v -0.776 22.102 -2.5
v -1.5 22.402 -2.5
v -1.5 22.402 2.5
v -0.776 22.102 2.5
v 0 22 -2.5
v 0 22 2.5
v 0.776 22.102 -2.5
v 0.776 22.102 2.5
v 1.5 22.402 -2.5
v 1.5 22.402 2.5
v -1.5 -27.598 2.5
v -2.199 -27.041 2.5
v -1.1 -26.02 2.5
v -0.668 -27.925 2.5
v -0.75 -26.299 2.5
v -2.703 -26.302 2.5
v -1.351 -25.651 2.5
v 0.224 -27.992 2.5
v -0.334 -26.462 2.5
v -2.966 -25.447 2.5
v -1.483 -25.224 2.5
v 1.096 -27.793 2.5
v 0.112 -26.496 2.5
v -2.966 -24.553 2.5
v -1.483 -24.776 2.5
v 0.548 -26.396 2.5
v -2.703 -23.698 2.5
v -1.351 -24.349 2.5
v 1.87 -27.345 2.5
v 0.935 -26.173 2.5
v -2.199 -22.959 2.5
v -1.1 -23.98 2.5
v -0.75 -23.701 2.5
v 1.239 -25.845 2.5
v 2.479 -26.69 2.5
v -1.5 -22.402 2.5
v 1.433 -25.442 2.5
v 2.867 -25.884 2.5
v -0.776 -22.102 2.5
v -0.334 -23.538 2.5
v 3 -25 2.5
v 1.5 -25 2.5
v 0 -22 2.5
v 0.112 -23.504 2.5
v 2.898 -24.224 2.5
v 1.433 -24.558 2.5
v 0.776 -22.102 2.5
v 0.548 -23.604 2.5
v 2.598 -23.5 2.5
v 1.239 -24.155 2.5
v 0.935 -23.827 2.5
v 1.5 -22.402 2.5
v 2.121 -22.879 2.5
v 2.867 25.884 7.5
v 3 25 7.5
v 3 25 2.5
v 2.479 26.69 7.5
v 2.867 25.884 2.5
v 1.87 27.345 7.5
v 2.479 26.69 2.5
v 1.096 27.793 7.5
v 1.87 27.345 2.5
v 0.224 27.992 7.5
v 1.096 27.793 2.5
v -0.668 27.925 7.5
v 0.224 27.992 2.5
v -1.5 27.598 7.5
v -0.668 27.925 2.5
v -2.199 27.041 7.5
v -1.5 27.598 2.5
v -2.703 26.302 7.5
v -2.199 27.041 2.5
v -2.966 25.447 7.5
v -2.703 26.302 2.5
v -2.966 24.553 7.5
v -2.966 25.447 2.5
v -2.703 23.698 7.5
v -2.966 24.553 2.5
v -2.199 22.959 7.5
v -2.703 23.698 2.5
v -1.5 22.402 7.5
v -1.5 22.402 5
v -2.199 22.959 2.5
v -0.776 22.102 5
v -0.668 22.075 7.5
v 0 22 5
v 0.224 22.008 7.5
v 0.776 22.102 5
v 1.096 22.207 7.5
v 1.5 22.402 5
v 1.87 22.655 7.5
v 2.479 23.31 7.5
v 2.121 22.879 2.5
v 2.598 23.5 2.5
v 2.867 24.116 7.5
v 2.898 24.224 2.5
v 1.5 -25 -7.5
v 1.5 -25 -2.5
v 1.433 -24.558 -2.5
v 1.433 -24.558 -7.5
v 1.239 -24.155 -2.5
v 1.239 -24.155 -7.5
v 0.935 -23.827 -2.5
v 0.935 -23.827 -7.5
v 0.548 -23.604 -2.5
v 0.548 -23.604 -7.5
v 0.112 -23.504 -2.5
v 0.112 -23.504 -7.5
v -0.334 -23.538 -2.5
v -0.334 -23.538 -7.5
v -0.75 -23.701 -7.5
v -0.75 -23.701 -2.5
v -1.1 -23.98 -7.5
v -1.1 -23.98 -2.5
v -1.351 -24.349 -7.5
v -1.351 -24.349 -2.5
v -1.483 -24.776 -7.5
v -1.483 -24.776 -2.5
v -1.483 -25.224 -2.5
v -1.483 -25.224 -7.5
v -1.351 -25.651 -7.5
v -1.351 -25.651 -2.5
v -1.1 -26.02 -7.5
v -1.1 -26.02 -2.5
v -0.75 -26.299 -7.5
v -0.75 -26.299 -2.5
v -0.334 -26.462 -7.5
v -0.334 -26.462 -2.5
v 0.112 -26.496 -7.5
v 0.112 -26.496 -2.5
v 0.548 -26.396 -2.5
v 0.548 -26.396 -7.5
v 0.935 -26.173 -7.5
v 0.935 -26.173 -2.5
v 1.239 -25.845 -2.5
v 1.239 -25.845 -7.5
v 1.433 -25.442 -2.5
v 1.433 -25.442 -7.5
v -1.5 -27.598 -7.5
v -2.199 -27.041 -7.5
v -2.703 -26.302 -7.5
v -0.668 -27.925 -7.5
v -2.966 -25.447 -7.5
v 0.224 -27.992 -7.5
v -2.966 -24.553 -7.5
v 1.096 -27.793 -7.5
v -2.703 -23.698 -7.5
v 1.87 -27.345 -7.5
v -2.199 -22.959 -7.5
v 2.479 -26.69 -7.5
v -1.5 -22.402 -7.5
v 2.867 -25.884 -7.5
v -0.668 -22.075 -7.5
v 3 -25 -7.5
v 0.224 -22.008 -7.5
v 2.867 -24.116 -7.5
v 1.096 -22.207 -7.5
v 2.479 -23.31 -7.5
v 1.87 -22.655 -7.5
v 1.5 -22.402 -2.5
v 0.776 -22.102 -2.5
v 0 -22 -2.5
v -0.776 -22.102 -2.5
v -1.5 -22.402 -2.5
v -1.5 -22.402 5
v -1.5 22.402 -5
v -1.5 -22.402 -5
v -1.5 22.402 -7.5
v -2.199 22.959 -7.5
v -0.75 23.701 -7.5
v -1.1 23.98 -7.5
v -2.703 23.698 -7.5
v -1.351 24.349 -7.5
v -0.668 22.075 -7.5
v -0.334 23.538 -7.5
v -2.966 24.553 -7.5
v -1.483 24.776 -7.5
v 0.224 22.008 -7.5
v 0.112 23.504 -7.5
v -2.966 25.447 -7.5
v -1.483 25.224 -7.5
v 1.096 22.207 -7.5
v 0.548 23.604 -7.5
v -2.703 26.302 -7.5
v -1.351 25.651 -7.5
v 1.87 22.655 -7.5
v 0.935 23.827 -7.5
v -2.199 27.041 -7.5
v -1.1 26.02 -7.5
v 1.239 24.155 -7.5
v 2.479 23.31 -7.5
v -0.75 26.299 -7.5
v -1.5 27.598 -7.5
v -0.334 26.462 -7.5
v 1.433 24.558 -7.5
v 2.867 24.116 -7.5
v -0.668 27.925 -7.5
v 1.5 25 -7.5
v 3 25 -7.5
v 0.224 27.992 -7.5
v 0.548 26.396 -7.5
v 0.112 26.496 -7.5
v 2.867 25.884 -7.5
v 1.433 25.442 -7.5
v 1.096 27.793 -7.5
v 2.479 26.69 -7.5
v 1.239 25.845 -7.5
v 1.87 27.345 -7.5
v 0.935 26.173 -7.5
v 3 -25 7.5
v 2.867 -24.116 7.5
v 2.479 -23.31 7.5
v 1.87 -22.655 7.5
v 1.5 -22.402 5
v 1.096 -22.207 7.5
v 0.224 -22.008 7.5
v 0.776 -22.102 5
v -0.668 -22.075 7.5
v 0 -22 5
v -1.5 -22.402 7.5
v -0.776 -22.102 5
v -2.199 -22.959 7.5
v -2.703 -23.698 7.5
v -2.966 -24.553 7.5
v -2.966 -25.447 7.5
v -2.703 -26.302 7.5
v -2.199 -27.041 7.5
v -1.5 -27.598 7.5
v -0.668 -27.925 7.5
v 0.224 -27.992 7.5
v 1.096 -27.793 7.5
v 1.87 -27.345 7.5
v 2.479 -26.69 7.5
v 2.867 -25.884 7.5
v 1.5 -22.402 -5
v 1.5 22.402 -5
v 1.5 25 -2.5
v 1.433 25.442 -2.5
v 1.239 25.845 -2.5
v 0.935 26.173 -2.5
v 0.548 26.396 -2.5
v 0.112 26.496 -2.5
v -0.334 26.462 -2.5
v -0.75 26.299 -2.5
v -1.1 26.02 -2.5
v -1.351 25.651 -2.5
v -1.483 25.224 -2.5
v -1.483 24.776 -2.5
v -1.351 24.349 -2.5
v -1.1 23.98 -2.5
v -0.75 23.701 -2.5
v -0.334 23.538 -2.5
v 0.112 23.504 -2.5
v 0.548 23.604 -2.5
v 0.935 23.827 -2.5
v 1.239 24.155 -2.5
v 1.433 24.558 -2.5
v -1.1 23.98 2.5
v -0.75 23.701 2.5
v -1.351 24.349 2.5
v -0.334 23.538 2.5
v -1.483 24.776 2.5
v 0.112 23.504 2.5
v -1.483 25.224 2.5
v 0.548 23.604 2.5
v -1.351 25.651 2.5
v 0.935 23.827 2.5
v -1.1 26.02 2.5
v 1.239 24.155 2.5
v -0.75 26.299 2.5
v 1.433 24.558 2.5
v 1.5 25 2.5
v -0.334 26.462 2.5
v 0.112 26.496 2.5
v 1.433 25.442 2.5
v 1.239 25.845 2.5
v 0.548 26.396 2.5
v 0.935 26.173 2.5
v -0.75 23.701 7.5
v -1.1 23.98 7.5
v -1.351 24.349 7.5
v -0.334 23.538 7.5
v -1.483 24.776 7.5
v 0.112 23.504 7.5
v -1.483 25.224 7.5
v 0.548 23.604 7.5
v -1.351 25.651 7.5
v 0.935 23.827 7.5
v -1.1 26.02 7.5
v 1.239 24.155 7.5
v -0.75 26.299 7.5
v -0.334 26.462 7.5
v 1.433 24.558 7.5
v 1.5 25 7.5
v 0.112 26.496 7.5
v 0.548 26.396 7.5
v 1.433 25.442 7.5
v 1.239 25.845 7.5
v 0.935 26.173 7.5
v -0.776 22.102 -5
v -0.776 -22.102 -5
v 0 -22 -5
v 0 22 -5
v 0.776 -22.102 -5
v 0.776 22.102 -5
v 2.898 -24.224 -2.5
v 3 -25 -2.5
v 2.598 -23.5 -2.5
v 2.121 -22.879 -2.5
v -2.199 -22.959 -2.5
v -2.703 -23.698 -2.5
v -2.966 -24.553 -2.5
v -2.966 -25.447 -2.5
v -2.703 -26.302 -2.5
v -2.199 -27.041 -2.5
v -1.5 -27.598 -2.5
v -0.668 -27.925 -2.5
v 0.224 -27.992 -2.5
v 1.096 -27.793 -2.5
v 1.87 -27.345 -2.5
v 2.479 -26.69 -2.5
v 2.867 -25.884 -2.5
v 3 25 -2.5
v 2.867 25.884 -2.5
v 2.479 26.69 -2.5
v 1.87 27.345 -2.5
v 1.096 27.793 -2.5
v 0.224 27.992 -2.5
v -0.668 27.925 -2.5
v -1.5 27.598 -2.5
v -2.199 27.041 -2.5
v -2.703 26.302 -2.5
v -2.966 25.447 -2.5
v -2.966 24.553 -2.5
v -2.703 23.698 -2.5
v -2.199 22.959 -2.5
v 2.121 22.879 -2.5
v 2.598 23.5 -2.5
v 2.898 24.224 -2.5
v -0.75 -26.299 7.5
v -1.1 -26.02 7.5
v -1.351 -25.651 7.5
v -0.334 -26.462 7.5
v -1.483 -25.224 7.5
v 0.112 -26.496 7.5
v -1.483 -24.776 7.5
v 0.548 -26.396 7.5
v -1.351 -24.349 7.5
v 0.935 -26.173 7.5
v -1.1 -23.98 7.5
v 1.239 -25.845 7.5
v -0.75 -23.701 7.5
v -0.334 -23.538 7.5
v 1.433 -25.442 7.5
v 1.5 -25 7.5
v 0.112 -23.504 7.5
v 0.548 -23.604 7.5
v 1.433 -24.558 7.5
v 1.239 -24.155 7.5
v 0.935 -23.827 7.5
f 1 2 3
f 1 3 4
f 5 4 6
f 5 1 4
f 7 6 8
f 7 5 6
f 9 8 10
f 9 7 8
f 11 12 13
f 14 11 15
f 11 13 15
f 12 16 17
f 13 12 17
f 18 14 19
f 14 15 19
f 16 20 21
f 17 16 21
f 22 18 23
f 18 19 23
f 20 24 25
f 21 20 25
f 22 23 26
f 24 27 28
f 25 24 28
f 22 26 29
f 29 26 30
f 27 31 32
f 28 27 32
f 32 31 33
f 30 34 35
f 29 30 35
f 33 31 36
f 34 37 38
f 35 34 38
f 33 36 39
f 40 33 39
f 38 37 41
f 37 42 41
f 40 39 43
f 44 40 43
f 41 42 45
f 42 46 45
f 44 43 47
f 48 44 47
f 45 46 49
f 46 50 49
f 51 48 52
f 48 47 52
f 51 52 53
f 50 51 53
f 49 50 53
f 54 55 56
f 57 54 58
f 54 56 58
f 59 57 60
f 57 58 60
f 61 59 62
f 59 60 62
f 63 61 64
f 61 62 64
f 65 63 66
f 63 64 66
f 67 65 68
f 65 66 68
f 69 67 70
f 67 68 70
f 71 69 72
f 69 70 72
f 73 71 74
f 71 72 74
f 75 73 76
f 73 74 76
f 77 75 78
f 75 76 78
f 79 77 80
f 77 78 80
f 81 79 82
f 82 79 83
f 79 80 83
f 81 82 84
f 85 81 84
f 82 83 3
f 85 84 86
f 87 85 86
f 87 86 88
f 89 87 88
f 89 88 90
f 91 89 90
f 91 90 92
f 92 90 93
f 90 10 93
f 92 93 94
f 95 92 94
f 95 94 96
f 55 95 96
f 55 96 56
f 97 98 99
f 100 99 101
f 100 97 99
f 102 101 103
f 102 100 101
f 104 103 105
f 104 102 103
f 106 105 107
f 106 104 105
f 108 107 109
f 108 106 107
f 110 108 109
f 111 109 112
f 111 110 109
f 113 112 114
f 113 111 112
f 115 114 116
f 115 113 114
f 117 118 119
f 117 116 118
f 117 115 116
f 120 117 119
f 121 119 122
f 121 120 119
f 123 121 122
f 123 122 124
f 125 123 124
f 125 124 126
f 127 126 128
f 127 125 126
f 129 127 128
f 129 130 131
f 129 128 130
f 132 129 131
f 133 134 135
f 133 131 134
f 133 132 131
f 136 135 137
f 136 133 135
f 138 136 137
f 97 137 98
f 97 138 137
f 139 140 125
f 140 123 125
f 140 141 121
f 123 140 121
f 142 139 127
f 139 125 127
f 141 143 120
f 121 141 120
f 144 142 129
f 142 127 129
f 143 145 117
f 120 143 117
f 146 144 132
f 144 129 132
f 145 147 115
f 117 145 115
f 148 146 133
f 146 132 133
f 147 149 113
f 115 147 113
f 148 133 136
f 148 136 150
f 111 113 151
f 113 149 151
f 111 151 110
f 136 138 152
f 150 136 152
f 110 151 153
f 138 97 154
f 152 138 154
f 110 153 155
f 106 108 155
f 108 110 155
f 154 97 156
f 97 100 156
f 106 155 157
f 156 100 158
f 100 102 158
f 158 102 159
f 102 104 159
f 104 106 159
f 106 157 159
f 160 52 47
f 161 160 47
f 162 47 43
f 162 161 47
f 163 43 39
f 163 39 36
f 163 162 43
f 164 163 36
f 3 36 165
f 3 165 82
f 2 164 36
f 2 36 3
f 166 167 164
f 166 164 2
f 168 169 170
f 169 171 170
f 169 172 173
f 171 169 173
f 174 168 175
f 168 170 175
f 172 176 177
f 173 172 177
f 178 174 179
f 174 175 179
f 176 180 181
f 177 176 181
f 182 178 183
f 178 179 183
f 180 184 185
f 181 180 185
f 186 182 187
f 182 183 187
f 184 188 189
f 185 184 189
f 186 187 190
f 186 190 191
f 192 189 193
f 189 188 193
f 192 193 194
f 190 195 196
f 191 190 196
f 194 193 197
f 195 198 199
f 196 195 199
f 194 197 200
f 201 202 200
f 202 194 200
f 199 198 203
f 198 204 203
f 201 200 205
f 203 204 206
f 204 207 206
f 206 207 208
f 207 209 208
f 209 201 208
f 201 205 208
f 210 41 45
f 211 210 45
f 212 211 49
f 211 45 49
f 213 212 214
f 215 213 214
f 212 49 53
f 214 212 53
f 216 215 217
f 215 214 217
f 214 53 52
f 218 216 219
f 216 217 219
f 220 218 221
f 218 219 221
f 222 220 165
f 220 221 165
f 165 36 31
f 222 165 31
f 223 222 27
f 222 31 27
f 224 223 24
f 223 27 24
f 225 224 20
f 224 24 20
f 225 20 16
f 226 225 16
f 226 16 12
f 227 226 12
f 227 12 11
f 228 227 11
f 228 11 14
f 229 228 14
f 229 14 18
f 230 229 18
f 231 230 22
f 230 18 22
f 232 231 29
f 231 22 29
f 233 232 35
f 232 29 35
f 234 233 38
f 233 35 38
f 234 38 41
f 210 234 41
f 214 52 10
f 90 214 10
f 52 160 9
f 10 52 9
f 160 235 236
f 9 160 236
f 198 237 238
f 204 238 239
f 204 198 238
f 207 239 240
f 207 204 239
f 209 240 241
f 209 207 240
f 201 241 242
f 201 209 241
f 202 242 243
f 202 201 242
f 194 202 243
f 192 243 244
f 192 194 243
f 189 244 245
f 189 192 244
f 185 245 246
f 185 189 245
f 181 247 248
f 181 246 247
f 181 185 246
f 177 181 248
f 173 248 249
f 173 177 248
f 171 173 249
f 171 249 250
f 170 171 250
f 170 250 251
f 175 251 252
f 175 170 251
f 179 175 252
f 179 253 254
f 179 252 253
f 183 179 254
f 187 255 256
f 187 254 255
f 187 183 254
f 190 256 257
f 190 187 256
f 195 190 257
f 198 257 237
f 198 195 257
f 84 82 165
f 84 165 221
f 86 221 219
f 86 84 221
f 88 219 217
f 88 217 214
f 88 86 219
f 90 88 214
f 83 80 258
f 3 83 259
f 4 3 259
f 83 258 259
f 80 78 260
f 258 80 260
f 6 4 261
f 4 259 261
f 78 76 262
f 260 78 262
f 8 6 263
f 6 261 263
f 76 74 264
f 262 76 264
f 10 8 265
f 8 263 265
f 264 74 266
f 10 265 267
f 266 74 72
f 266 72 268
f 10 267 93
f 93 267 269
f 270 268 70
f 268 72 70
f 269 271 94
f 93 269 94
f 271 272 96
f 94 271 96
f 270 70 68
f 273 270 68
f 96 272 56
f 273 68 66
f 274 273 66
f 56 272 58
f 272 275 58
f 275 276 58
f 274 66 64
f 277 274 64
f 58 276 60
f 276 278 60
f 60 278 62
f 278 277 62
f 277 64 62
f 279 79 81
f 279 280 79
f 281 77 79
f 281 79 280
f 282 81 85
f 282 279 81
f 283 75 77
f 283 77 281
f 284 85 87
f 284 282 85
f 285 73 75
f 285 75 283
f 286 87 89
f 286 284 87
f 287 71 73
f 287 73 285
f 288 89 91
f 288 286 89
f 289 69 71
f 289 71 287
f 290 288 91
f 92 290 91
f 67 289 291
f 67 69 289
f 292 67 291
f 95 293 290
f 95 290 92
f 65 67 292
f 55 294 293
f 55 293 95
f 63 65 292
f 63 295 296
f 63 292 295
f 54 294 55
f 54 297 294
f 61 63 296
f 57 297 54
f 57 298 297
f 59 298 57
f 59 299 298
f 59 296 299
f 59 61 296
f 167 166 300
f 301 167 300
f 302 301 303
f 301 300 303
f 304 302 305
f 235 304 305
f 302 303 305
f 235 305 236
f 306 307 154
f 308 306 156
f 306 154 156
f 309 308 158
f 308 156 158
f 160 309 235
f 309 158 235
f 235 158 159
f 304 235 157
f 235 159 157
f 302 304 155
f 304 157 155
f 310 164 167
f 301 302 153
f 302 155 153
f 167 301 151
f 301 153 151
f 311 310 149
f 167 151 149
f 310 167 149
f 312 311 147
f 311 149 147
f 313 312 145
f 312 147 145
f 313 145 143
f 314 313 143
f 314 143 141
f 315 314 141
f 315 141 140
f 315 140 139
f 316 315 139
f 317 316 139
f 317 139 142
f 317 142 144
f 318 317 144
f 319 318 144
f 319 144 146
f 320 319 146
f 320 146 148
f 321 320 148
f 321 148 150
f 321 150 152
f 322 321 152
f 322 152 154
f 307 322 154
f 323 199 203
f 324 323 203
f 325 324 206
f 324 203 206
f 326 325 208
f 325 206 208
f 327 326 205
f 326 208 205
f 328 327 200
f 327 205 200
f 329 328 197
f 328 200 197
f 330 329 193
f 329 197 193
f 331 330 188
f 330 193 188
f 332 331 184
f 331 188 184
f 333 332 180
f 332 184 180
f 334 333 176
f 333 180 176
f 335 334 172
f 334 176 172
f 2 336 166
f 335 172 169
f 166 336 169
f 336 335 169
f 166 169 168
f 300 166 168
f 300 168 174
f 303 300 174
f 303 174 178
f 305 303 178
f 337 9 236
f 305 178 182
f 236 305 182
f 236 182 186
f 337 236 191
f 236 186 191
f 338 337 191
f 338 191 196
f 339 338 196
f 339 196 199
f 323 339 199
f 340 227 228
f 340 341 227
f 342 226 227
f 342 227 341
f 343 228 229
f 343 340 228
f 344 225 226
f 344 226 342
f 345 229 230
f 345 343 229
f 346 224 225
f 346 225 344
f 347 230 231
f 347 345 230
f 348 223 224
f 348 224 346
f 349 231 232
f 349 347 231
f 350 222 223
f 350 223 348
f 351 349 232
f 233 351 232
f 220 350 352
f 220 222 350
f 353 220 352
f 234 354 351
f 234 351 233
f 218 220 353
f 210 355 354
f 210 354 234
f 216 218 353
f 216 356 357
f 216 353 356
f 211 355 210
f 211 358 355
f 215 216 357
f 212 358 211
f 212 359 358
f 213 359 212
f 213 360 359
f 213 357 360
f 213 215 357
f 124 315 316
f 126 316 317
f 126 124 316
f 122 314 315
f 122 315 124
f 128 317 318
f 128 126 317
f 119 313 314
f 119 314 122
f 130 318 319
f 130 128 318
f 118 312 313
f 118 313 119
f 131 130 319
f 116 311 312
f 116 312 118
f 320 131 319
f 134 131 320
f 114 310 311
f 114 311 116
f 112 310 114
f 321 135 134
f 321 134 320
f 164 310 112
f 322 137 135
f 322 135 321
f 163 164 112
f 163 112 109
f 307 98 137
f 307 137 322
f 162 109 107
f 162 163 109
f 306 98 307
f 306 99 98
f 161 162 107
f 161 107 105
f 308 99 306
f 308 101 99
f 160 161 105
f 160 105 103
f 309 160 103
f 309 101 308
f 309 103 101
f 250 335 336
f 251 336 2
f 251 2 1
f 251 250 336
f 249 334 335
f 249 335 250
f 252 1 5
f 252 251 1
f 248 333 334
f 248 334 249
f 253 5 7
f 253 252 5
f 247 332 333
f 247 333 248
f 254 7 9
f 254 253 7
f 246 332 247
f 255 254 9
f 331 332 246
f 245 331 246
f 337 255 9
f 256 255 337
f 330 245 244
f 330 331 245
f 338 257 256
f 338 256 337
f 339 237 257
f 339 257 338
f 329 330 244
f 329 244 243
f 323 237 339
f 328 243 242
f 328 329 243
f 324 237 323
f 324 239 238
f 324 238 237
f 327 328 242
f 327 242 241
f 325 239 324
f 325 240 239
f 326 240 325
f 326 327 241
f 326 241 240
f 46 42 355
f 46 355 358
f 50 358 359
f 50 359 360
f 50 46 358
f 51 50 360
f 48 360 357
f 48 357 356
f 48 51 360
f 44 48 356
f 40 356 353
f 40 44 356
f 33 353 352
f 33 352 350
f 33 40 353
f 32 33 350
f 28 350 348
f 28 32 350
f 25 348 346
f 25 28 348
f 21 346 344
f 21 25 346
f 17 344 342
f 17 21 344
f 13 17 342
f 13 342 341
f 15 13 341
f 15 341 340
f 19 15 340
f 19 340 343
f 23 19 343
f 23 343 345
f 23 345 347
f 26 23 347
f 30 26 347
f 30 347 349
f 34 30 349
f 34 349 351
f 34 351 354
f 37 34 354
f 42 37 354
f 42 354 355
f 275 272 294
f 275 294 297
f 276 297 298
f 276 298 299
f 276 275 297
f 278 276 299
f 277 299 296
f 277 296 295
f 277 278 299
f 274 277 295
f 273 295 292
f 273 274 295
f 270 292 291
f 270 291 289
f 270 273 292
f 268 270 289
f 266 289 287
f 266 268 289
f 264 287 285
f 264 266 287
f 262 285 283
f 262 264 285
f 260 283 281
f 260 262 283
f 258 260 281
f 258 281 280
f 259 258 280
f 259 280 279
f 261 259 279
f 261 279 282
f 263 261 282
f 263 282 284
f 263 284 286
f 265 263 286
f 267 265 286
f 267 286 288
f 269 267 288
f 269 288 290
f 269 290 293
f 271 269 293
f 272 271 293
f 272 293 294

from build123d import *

# Parameters (mm, degrees)
SALIENTE_EXTRUIR1_DEPTH      = 5
SALIENTE_EXTRUIR1_DEPTH_BACK = 5
CROQUIS1_W                   = 3
CROQUIS1_H                   = 50
SALIENTE_EXTRUIR3_DEPTH      = 7.5
SALIENTE_EXTRUIR3_DEPTH_BACK = 7.5
CROQUIS1_4_R                 = 3
CROQUIS1_4_R_2               = 1.5
CORTAR_EXTRUIR1_DEPTH        = 2.5
CORTAR_EXTRUIR1_DEPTH_BACK   = 2.5
CROQUIS1_5_R                 = 3
CORTAR_EXTRUIR2_DEPTH        = 10
CORTAR_EXTRUIR2_DEPTH_BACK   = 10
CROQUIS1_6_R                 = 1.5


with BuildPart() as part:
    # Croquis1 → Saliente-Extruir1 (new, two sides: drawn at the far end of the back side and taken through both)
    with BuildSketch(Plane.XY.offset(-SALIENTE_EXTRUIR1_DEPTH_BACK)):
        Rectangle(CROQUIS1_W, CROQUIS1_H)
    extrude(amount=SALIENTE_EXTRUIR1_DEPTH + SALIENTE_EXTRUIR1_DEPTH_BACK)

    # Croquis1<4> → Saliente-Extruir3 (add, two sides: drawn at the far end of the back side and taken through both)
    # profile 1 of 2: a face of its own
    with BuildSketch(Plane.XY.offset(-SALIENTE_EXTRUIR3_DEPTH_BACK)):
        with Locations((0, 25)):
            Circle(CROQUIS1_4_R)
        with Locations((0, 25)):
            Circle(CROQUIS1_4_R_2, mode=Mode.SUBTRACT)
    # profile 2 of 2: a face of its own
    with BuildSketch(Plane.XY.offset(-SALIENTE_EXTRUIR3_DEPTH_BACK)):
        with Locations((0, -25)):
            Circle(CROQUIS1_4_R)
        with Locations((0, -25)):
            Circle(CROQUIS1_4_R_2, mode=Mode.SUBTRACT)
    extrude(amount=SALIENTE_EXTRUIR3_DEPTH + SALIENTE_EXTRUIR3_DEPTH_BACK)

    # Croquis1<5> → Cortar-Extruir1 (cut, two sides: drawn at the far end of the back side and taken through both)
    with BuildSketch(Plane.XY.offset(-CORTAR_EXTRUIR1_DEPTH_BACK)):
        with Locations((0, 25)):
            Circle(CROQUIS1_5_R)
        with Locations((0, -25)):
            Circle(CROQUIS1_5_R)
    extrude(amount=CORTAR_EXTRUIR1_DEPTH + CORTAR_EXTRUIR1_DEPTH_BACK, mode=Mode.SUBTRACT)

    # Croquis1<6> → Cortar-Extruir2 (cut, two sides: drawn at the far end of the back side and taken through both)
    with BuildSketch(Plane.XY.offset(-CORTAR_EXTRUIR2_DEPTH_BACK)):
        with Locations((0, 25)):
            Circle(CROQUIS1_6_R)
        with Locations((0, -25)):
            Circle(CROQUIS1_6_R)
    extrude(amount=CORTAR_EXTRUIR2_DEPTH + CORTAR_EXTRUIR2_DEPTH_BACK, mode=Mode.SUBTRACT)


solid = part.part
